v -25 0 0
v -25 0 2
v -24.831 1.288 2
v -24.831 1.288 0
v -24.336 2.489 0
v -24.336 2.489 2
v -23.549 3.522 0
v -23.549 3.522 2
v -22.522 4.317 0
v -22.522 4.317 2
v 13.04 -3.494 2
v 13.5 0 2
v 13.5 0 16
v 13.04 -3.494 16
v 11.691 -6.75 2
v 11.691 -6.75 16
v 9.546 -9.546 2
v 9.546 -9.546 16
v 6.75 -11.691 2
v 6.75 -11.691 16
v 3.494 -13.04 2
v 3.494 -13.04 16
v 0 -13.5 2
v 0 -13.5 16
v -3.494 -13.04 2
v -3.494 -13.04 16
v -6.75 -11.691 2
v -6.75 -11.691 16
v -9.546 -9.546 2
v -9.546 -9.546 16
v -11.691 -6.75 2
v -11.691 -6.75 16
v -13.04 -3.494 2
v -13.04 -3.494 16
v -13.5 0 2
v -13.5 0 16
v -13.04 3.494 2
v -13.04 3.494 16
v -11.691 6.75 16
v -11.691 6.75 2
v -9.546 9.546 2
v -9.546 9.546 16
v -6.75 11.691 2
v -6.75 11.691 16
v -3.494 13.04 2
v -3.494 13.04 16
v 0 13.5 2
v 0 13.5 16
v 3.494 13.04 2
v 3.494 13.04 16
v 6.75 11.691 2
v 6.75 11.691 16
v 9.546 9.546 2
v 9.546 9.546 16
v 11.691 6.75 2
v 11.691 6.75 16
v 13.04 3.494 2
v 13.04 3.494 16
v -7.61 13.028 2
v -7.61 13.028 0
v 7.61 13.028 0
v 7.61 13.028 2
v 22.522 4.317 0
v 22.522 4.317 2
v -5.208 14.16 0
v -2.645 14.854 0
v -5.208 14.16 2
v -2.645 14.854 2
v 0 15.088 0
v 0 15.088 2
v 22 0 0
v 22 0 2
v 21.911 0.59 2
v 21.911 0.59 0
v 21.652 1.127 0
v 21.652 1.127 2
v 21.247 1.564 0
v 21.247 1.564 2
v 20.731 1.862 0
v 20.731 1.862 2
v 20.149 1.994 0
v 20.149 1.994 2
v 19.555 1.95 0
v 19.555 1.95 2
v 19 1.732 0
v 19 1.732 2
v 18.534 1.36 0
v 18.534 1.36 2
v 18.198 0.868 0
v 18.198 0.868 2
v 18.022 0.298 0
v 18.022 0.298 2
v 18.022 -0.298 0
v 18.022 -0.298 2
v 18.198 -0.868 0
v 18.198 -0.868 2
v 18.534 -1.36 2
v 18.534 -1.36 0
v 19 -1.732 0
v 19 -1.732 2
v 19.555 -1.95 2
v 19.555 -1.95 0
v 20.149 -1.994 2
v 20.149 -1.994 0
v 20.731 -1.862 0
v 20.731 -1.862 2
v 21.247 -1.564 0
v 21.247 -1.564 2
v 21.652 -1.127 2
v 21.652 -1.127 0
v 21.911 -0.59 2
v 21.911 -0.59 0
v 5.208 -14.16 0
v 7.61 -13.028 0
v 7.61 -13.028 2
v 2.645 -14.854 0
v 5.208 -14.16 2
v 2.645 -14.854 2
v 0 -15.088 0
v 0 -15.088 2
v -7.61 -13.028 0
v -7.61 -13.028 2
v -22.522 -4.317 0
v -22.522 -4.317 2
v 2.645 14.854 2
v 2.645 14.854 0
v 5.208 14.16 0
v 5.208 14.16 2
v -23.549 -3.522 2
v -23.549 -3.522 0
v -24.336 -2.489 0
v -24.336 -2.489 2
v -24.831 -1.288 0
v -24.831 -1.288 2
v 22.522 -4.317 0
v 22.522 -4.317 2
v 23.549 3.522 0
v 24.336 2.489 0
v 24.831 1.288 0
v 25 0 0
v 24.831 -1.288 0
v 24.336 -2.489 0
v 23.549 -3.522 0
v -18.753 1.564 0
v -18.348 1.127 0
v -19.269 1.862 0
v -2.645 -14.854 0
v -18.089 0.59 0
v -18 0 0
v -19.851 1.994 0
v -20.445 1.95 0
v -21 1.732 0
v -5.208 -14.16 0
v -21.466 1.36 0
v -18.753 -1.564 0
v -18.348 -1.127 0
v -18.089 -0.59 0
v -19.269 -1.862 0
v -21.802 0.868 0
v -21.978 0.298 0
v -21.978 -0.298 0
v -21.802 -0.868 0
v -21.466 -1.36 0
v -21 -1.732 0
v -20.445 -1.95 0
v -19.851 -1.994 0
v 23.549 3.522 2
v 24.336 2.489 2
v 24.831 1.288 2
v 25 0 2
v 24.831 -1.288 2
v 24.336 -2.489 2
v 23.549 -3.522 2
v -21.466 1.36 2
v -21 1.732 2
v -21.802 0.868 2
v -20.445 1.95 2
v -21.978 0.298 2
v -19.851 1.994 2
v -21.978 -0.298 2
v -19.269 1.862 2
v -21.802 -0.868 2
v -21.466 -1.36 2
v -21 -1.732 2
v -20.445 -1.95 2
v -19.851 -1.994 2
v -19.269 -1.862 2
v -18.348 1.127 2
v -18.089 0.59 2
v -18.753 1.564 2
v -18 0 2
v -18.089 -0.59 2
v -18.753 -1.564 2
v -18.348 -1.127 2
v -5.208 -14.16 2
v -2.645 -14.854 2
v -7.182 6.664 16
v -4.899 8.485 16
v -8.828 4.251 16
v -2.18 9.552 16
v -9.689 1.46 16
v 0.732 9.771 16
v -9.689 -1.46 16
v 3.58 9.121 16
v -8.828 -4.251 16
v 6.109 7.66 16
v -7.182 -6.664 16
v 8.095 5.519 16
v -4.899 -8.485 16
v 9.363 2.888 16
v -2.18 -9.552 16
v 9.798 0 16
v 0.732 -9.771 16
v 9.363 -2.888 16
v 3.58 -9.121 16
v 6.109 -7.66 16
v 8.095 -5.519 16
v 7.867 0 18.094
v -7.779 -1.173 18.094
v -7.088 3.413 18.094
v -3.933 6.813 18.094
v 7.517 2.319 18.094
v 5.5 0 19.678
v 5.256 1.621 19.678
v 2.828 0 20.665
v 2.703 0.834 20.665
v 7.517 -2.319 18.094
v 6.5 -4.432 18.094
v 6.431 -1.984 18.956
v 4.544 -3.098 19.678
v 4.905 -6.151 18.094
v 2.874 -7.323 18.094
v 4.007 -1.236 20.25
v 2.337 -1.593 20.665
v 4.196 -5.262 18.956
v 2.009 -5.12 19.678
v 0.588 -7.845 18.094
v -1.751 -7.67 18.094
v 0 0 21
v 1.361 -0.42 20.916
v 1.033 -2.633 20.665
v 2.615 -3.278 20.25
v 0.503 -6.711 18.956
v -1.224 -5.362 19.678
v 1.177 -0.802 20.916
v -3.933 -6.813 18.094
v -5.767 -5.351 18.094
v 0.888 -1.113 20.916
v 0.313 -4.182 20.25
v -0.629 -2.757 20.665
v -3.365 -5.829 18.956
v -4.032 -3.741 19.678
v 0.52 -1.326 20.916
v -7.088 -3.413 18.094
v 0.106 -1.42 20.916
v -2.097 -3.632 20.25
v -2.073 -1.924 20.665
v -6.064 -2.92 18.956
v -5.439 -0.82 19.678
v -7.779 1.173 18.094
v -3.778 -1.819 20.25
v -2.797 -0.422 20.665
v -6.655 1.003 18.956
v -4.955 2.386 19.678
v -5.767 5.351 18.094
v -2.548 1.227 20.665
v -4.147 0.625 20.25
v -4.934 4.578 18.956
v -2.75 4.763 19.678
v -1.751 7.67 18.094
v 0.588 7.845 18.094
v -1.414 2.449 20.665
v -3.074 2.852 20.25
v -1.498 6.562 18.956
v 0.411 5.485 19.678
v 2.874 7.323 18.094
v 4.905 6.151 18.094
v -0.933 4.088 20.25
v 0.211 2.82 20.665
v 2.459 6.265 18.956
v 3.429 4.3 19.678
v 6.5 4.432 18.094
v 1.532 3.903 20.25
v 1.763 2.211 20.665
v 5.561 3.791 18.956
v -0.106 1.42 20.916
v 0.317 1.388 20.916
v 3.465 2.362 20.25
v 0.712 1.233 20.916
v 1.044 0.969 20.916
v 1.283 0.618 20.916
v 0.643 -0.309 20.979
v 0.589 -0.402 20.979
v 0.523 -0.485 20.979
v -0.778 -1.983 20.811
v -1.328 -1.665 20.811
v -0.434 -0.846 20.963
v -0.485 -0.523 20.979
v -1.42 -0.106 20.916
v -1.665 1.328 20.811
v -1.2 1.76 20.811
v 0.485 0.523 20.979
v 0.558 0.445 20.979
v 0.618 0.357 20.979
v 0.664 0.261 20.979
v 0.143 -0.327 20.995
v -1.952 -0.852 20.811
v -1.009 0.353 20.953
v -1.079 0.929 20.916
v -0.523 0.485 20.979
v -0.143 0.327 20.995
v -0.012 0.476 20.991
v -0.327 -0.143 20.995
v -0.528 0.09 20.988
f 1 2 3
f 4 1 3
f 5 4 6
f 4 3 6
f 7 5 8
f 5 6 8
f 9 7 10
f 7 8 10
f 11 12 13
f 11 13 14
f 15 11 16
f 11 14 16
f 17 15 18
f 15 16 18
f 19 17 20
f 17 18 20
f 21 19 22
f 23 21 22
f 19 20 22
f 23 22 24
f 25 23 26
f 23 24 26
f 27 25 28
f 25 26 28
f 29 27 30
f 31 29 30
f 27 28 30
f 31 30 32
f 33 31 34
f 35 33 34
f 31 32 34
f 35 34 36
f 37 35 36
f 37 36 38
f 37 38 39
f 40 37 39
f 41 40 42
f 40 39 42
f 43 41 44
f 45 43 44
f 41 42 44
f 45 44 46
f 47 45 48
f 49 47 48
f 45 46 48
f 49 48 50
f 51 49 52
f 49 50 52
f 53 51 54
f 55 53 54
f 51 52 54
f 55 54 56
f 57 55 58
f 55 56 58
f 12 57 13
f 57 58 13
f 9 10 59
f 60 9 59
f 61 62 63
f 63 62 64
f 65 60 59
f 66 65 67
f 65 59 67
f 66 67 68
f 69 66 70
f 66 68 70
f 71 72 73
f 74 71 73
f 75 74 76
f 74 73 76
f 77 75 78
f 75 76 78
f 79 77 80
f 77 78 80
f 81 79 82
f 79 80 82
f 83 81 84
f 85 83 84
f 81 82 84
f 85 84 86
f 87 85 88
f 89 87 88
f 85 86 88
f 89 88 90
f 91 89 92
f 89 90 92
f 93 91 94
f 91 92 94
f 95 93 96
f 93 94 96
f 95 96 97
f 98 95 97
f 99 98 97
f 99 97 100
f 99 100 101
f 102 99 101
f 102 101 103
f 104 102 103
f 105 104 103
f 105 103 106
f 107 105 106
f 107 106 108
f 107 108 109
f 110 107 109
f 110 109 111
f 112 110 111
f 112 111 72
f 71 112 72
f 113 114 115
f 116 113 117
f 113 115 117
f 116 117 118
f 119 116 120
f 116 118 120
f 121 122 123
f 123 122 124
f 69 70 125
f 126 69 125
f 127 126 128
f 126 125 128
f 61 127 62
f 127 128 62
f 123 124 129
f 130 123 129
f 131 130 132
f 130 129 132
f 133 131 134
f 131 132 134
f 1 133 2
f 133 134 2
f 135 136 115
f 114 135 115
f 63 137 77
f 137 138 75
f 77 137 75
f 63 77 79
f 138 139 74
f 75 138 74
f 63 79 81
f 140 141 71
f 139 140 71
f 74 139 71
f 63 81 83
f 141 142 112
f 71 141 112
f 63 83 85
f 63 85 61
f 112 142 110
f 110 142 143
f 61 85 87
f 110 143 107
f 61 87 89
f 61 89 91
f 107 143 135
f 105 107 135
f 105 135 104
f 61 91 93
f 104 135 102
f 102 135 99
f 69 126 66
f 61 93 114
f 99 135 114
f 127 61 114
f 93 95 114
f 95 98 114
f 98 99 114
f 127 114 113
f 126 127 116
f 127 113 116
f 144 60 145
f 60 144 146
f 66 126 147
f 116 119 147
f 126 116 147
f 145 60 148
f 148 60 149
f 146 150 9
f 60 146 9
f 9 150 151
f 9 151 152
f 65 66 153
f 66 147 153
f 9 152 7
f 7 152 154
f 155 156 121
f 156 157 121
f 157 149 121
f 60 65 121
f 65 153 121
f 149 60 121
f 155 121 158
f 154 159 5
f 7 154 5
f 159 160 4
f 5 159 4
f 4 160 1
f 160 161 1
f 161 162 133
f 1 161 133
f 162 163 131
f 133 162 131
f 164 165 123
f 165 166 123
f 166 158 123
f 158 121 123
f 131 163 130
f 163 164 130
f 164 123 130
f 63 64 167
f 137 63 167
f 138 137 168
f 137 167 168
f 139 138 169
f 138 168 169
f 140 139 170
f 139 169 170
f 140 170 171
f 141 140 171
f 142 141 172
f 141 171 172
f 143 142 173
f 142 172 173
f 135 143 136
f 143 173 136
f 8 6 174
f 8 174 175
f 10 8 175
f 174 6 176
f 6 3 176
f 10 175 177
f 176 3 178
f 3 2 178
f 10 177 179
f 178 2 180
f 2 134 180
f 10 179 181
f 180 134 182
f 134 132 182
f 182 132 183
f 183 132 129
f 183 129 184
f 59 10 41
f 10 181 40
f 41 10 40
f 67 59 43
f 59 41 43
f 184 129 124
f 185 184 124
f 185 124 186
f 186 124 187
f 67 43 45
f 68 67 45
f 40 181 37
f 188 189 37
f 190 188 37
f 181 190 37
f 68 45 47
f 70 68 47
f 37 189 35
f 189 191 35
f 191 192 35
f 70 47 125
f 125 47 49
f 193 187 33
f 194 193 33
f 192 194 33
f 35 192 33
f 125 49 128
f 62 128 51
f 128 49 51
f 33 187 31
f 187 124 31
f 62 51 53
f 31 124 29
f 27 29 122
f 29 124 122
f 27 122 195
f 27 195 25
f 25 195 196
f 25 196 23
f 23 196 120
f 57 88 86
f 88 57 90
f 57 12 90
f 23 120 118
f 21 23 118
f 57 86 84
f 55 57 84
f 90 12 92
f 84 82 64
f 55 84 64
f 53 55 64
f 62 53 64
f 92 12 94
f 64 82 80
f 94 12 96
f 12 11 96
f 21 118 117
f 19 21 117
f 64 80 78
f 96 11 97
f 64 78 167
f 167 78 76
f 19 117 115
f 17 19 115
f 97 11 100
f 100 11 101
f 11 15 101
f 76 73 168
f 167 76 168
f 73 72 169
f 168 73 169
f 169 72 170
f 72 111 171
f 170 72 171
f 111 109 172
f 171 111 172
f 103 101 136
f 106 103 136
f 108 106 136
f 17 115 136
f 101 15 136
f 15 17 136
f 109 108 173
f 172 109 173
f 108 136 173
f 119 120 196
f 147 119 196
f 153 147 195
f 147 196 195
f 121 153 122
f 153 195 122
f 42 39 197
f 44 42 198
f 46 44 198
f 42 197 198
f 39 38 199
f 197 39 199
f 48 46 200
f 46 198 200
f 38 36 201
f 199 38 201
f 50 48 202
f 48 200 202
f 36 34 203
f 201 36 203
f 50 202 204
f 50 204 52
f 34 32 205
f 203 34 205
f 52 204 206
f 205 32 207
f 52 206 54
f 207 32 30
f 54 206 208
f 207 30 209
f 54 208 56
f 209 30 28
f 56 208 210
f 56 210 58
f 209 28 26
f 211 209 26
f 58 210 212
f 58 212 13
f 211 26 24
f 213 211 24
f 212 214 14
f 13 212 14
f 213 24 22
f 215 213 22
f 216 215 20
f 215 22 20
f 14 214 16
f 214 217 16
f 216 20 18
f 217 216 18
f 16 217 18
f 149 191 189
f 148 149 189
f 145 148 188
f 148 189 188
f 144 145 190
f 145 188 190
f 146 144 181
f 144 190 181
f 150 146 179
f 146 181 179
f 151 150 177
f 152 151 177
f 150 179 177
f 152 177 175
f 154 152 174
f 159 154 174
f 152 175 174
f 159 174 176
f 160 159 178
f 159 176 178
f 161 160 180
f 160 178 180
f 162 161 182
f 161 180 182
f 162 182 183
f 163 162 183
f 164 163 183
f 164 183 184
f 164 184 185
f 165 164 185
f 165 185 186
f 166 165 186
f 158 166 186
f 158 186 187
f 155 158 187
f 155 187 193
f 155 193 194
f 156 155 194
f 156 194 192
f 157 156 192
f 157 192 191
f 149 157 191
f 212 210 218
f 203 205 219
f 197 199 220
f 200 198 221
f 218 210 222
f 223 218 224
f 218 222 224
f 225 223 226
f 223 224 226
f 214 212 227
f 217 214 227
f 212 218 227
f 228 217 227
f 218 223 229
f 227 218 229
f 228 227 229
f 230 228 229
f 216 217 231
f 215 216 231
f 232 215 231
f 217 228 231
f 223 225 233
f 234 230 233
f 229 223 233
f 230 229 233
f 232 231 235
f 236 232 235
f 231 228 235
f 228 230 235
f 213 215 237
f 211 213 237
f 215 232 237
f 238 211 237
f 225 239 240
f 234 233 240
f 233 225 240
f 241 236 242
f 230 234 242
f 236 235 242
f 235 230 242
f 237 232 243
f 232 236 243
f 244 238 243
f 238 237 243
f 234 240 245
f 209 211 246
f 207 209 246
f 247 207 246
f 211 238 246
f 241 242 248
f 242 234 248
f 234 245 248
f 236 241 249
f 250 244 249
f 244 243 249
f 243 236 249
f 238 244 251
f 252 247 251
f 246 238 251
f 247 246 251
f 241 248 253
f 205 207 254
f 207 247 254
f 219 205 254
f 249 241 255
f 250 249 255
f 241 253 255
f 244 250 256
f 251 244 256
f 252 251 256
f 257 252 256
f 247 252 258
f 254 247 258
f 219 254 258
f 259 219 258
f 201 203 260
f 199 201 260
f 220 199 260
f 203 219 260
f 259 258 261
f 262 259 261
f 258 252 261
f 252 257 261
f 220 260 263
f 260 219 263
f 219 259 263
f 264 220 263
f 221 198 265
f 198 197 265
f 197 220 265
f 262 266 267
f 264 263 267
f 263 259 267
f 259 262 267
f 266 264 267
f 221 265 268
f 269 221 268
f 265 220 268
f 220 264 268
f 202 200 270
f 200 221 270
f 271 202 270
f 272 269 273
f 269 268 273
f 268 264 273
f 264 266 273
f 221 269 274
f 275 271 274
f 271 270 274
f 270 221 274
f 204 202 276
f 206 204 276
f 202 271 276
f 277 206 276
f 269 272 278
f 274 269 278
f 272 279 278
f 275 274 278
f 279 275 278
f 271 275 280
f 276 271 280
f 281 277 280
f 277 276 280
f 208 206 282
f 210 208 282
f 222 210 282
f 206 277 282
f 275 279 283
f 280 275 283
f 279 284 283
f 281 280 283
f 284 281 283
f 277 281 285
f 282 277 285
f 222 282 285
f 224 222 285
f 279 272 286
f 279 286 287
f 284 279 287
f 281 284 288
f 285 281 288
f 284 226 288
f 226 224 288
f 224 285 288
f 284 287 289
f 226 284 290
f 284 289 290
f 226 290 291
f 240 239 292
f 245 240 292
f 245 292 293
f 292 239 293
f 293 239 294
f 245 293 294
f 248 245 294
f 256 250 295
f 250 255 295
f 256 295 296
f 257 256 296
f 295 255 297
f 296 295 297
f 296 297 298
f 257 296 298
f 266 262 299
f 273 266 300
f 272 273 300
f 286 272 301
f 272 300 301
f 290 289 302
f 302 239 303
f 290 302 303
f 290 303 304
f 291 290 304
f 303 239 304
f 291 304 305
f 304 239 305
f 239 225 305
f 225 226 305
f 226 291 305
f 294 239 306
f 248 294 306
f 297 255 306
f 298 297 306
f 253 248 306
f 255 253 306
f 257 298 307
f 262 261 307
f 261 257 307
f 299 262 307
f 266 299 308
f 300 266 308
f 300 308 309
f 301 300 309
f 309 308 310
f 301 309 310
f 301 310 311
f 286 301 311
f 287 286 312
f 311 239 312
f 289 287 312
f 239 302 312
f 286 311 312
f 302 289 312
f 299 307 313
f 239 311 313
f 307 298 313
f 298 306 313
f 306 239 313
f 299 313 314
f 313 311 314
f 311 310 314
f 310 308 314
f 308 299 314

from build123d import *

# Parameters (mm, degrees)
F2_R     = 29.922306
F2_R_2   = 2
F3_DEPTH = 2.001


with BuildPart() as f1:
    # F0 (on Front) → F1 (revolve)
    with BuildSketch(Plane.XZ):
        with BuildLine():
            Line((13.5, 16), (9.798011, 16))
            ThreePointArc((9.798011, 16), (5.500023, 19.677756), (0, 21))
            Line((0, 21), (0, 0))
            Line((0, 0), (25, 0))
            Line((25, 0), (25, 2))
            Line((25, 2), (13.5, 2))
            Line((13.5, 2), (13.5, 16))
        make_face()
    revolve(axis=Axis((0, 0, 10.5), (0, 0, -1)))

    # F2 (on face) → F3 (cut, through all)
    with BuildSketch(Plane.XY.offset(2)):
        Circle(F2_R)
        with BuildLine():
            ThreePointArc((-25, 0), (-24.336437, 2.489038), (-22.521875, 4.317424))
            Line((-22.521875, 4.317424), (-7.609758, 13.027826))
            ThreePointArc((-7.609758, 13.027826), (-3.941785, 14.563481), (0, 15.0875))
            ThreePointArc((0, 15.0875), (3.941785, 14.563481), (7.609758, 13.027826))
            Line((7.609758, 13.027826), (22.521875, 4.317424))
            ThreePointArc((22.521875, 4.317424), (24.336437, 2.489038), (25, 0))
            ThreePointArc((25, 0), (24.336437, -2.489038), (22.521875, -4.317424))
            Line((22.521875, -4.317424), (7.609758, -13.027826))
            ThreePointArc((7.609758, -13.027826), (3.941785, -14.563481), (0, -15.0875))
            ThreePointArc((0, -15.0875), (-3.941785, -14.563481), (-7.609758, -13.027826))
            Line((-7.609758, -13.027826), (-22.521875, -4.317424))
            ThreePointArc((-22.521875, -4.317424), (-24.336437, -2.489038), (-25, 0))
        make_face(mode=Mode.SUBTRACT)
        with Locations((-20, 0)):
            Circle(F2_R_2)
        with Locations((20, 0)):
            Circle(F2_R_2)
    extrude(amount=-F3_DEPTH, mode=Mode.SUBTRACT)


solid = f1.part
